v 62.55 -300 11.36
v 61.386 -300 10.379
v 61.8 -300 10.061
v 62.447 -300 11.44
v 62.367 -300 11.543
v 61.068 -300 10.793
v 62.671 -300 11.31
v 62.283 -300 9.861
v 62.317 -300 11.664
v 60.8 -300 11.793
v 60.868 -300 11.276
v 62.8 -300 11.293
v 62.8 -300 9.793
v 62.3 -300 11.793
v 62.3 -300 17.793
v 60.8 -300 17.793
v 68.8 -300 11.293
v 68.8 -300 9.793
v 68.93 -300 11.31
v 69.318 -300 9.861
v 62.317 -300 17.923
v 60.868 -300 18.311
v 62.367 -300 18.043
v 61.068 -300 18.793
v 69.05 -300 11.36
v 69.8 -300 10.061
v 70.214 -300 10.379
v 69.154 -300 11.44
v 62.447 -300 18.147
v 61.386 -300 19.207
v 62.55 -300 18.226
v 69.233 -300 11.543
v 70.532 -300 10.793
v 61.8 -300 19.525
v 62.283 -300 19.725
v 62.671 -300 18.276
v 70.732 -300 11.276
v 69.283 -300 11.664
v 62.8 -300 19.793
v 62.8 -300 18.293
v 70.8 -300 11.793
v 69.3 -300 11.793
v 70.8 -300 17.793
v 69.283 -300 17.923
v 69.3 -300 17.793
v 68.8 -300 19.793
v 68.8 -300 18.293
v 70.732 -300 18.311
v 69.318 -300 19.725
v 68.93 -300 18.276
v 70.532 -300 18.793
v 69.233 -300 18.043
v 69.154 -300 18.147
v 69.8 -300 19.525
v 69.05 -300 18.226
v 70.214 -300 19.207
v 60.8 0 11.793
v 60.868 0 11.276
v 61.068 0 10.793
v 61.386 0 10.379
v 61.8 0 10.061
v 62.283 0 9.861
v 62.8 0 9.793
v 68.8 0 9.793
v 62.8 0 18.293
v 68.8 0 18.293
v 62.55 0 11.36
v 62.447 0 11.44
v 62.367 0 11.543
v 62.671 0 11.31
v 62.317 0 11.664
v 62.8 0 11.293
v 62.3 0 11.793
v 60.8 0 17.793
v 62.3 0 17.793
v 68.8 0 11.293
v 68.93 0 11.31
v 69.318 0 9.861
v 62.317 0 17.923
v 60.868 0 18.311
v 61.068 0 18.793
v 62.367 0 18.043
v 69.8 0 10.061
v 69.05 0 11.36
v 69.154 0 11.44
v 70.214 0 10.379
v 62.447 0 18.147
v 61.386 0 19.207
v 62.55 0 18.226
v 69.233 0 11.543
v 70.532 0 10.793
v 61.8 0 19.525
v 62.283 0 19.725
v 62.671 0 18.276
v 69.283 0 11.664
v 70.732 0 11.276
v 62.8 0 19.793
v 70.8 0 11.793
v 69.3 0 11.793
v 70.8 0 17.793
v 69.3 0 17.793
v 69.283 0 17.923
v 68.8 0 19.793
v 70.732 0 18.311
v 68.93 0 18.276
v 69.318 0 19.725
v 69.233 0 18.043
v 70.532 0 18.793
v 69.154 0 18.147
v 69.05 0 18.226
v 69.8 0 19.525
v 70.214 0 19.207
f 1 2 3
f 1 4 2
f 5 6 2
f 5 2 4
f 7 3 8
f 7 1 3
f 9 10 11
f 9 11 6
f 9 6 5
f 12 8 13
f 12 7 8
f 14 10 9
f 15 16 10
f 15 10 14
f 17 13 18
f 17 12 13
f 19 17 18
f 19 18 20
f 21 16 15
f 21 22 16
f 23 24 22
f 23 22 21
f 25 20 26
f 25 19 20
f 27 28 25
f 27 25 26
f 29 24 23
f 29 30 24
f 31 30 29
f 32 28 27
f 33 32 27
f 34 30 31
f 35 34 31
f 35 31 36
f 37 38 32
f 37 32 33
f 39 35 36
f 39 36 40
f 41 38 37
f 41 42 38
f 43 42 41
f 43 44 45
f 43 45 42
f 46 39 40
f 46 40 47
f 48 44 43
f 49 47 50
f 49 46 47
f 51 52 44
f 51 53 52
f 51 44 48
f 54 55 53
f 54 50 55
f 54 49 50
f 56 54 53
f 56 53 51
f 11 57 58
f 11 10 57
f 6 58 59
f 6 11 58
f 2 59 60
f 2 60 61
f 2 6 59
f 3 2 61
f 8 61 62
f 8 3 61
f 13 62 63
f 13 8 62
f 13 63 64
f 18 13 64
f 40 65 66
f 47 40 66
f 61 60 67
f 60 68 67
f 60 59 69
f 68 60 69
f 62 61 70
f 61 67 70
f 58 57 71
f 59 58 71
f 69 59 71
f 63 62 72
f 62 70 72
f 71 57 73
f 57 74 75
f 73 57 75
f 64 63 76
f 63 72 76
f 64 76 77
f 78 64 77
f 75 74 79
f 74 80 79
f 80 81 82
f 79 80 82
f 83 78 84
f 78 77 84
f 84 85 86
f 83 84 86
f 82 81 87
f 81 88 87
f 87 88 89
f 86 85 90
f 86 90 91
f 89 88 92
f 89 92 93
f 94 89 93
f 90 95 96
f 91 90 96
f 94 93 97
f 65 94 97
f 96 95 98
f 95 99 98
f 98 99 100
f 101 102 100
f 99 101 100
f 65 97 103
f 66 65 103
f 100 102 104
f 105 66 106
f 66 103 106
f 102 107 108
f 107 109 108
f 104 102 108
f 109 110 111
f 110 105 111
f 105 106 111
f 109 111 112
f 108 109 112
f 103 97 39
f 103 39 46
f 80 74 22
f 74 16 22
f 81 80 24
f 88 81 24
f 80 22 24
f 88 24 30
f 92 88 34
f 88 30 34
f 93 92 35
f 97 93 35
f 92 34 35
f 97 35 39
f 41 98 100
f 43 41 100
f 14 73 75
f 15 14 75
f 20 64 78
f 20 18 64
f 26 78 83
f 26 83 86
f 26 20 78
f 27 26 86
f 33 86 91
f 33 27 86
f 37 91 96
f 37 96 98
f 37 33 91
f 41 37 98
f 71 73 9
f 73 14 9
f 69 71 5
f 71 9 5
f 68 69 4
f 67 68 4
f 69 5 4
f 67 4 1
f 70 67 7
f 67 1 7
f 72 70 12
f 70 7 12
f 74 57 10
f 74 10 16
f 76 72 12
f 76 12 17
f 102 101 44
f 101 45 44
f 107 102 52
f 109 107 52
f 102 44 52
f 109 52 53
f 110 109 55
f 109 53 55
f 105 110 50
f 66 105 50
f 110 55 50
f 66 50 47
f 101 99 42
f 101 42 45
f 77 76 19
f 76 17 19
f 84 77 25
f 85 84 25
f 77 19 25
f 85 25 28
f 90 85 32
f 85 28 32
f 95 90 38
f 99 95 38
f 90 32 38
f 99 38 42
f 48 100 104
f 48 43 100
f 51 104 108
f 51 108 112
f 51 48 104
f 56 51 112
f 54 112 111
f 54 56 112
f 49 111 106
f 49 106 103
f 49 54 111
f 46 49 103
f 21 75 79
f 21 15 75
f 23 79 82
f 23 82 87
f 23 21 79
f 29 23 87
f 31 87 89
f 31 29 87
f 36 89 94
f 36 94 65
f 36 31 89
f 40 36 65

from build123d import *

# Parameters (mm, degrees)
F0_W     = 10
F0_H     = 10
F1_DEPTH = 300
F2_R     = 2
F3_T     = -1.5


with BuildPart() as f1:
    # F0 (on Front) → F1 (new body)
    with BuildSketch(Plane.XZ):
        with Locations((65.800157, 14.793174)):
            Rectangle(F0_W, F0_H)
    extrude(amount=F1_DEPTH)

    # F2
    f2_edges = [f1.edges().sort_by_distance(p)[0] for p in [
        (70.800157, -150, 19.793174),
        (60.800157, -150, 19.793174),
        (70.800157, -150, 9.793174),
        (60.800157, -150, 9.793174),
    ]]
    fillet(f2_edges, radius=F2_R)

    # F3
    f3_openings = [f1.faces().sort_by_distance(p)[0] for p in [
        (65.800157, -300, 14.793174),
        (65.800157, 0, 14.793174),
    ]]
    offset(amount=F3_T, openings=f3_openings)


solid = f1.part
